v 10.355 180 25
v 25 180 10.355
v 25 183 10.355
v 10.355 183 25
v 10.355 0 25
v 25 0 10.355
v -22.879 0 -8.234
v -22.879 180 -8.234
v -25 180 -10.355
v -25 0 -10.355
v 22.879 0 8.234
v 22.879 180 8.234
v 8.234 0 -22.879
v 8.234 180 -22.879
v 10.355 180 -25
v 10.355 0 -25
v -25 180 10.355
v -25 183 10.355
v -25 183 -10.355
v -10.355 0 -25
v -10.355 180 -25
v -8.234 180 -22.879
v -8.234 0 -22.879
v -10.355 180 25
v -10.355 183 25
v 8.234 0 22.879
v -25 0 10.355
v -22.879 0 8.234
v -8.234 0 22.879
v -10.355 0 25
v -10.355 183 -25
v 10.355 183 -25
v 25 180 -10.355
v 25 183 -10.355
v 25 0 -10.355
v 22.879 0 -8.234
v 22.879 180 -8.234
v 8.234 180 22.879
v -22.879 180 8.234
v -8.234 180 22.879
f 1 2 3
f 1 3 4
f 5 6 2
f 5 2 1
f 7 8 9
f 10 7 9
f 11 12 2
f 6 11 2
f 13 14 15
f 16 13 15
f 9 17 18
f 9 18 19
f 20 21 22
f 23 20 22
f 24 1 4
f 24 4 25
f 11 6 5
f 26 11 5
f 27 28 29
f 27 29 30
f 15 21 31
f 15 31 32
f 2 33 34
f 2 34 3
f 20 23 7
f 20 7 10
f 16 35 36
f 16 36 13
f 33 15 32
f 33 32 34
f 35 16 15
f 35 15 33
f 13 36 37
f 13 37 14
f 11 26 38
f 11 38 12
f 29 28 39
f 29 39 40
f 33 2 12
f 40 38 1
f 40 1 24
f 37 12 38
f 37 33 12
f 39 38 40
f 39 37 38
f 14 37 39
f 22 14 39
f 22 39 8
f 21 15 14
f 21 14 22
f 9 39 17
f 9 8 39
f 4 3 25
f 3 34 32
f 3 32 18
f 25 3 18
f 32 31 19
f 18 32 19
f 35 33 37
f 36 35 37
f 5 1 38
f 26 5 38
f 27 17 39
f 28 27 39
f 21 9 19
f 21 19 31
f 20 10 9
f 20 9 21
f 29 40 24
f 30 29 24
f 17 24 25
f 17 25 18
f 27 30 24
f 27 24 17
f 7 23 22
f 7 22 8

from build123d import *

# Parameters (mm, degrees)
RESSALTO_EXTRUS_O1_DEPTH   = 180
RESSALTO_EXTRUS_O1_2_DEPTH = 180
RESSALTO_EXTRUS_O1_3_DEPTH = 180
RESSALTO_EXTRUS_O1_4_DEPTH = 180
RESSALTO_EXTRUS_O2_DEPTH   = 3


with BuildPart() as part:
    # Esboço1 → Ressalto-extrusão1 (new body)
    with BuildSketch(Plane(origin=(0, 0, 0), x_dir=(1, 0, 0), z_dir=(0, 1, 0))):
        Polygon((-25, 10.355339059), (-10.355339059, 25), (-8.234018716, 22.878679656), (-22.878679656, 8.234018716), align=None)
    extrude(amount=RESSALTO_EXTRUS_O1_DEPTH)



with BuildPart() as body_2:
    # Esboço1 → Ressalto-extrus_o1 2 (new body)
    with BuildSketch(Plane(origin=(0, 0, 0), x_dir=(1, 0, 0), z_dir=(0, 1, 0))):
        Polygon((10.355339059, 25), (25, 10.355339059), (22.878679656, 8.234018716), (8.234018716, 22.878679656), align=None)
    extrude(amount=RESSALTO_EXTRUS_O1_2_DEPTH)


with BuildPart() as body_3:
    # Esboço1 → Ressalto-extrus_o1 3 (new body)
    with BuildSketch(Plane(origin=(0, 0, 0), x_dir=(1, 0, 0), z_dir=(0, 1, 0))):
        Polygon((25, -10.355339059), (10.355339059, -25), (8.234018716, -22.878679656), (22.878679656, -8.234018716), align=None)
    extrude(amount=RESSALTO_EXTRUS_O1_3_DEPTH)


with BuildPart() as body_4:
    # Esboço1 → Ressalto-extrus_o1 4 (new body)
    with BuildSketch(Plane(origin=(0, 0, 0), x_dir=(1, 0, 0), z_dir=(0, 1, 0))):
        Polygon((-10.355339059, -25), (-25, -10.355339059), (-22.878679656, -8.234018716), (-8.234018716, -22.878679656), align=None)
    extrude(amount=RESSALTO_EXTRUS_O1_4_DEPTH)


with BuildPart() as part_1:
    add(part.part)

    add(body_2.part)  # Ressalto-extrusão2 merges body 2

    add(body_3.part)  # Ressalto-extrusão2 merges body 3

    add(body_4.part)  # Ressalto-extrusão2 merges body 4
    # Esboço2 → Ressalto-extrusão2 (add)
    with BuildSketch(Plane(origin=(0, 180, 0), x_dir=(1, 0, 0), z_dir=(0, 1, 0))):
        Polygon((-10.355339059, 25), (10.355339059, 25), (25, 10.355339059), (25, -10.355339059), (10.355339059, -25), (-10.355339059, -25), (-25, -10.355339059), (-25, 10.355339059), align=None)
    extrude(amount=RESSALTO_EXTRUS_O2_DEPTH)


solid = part_1.part
